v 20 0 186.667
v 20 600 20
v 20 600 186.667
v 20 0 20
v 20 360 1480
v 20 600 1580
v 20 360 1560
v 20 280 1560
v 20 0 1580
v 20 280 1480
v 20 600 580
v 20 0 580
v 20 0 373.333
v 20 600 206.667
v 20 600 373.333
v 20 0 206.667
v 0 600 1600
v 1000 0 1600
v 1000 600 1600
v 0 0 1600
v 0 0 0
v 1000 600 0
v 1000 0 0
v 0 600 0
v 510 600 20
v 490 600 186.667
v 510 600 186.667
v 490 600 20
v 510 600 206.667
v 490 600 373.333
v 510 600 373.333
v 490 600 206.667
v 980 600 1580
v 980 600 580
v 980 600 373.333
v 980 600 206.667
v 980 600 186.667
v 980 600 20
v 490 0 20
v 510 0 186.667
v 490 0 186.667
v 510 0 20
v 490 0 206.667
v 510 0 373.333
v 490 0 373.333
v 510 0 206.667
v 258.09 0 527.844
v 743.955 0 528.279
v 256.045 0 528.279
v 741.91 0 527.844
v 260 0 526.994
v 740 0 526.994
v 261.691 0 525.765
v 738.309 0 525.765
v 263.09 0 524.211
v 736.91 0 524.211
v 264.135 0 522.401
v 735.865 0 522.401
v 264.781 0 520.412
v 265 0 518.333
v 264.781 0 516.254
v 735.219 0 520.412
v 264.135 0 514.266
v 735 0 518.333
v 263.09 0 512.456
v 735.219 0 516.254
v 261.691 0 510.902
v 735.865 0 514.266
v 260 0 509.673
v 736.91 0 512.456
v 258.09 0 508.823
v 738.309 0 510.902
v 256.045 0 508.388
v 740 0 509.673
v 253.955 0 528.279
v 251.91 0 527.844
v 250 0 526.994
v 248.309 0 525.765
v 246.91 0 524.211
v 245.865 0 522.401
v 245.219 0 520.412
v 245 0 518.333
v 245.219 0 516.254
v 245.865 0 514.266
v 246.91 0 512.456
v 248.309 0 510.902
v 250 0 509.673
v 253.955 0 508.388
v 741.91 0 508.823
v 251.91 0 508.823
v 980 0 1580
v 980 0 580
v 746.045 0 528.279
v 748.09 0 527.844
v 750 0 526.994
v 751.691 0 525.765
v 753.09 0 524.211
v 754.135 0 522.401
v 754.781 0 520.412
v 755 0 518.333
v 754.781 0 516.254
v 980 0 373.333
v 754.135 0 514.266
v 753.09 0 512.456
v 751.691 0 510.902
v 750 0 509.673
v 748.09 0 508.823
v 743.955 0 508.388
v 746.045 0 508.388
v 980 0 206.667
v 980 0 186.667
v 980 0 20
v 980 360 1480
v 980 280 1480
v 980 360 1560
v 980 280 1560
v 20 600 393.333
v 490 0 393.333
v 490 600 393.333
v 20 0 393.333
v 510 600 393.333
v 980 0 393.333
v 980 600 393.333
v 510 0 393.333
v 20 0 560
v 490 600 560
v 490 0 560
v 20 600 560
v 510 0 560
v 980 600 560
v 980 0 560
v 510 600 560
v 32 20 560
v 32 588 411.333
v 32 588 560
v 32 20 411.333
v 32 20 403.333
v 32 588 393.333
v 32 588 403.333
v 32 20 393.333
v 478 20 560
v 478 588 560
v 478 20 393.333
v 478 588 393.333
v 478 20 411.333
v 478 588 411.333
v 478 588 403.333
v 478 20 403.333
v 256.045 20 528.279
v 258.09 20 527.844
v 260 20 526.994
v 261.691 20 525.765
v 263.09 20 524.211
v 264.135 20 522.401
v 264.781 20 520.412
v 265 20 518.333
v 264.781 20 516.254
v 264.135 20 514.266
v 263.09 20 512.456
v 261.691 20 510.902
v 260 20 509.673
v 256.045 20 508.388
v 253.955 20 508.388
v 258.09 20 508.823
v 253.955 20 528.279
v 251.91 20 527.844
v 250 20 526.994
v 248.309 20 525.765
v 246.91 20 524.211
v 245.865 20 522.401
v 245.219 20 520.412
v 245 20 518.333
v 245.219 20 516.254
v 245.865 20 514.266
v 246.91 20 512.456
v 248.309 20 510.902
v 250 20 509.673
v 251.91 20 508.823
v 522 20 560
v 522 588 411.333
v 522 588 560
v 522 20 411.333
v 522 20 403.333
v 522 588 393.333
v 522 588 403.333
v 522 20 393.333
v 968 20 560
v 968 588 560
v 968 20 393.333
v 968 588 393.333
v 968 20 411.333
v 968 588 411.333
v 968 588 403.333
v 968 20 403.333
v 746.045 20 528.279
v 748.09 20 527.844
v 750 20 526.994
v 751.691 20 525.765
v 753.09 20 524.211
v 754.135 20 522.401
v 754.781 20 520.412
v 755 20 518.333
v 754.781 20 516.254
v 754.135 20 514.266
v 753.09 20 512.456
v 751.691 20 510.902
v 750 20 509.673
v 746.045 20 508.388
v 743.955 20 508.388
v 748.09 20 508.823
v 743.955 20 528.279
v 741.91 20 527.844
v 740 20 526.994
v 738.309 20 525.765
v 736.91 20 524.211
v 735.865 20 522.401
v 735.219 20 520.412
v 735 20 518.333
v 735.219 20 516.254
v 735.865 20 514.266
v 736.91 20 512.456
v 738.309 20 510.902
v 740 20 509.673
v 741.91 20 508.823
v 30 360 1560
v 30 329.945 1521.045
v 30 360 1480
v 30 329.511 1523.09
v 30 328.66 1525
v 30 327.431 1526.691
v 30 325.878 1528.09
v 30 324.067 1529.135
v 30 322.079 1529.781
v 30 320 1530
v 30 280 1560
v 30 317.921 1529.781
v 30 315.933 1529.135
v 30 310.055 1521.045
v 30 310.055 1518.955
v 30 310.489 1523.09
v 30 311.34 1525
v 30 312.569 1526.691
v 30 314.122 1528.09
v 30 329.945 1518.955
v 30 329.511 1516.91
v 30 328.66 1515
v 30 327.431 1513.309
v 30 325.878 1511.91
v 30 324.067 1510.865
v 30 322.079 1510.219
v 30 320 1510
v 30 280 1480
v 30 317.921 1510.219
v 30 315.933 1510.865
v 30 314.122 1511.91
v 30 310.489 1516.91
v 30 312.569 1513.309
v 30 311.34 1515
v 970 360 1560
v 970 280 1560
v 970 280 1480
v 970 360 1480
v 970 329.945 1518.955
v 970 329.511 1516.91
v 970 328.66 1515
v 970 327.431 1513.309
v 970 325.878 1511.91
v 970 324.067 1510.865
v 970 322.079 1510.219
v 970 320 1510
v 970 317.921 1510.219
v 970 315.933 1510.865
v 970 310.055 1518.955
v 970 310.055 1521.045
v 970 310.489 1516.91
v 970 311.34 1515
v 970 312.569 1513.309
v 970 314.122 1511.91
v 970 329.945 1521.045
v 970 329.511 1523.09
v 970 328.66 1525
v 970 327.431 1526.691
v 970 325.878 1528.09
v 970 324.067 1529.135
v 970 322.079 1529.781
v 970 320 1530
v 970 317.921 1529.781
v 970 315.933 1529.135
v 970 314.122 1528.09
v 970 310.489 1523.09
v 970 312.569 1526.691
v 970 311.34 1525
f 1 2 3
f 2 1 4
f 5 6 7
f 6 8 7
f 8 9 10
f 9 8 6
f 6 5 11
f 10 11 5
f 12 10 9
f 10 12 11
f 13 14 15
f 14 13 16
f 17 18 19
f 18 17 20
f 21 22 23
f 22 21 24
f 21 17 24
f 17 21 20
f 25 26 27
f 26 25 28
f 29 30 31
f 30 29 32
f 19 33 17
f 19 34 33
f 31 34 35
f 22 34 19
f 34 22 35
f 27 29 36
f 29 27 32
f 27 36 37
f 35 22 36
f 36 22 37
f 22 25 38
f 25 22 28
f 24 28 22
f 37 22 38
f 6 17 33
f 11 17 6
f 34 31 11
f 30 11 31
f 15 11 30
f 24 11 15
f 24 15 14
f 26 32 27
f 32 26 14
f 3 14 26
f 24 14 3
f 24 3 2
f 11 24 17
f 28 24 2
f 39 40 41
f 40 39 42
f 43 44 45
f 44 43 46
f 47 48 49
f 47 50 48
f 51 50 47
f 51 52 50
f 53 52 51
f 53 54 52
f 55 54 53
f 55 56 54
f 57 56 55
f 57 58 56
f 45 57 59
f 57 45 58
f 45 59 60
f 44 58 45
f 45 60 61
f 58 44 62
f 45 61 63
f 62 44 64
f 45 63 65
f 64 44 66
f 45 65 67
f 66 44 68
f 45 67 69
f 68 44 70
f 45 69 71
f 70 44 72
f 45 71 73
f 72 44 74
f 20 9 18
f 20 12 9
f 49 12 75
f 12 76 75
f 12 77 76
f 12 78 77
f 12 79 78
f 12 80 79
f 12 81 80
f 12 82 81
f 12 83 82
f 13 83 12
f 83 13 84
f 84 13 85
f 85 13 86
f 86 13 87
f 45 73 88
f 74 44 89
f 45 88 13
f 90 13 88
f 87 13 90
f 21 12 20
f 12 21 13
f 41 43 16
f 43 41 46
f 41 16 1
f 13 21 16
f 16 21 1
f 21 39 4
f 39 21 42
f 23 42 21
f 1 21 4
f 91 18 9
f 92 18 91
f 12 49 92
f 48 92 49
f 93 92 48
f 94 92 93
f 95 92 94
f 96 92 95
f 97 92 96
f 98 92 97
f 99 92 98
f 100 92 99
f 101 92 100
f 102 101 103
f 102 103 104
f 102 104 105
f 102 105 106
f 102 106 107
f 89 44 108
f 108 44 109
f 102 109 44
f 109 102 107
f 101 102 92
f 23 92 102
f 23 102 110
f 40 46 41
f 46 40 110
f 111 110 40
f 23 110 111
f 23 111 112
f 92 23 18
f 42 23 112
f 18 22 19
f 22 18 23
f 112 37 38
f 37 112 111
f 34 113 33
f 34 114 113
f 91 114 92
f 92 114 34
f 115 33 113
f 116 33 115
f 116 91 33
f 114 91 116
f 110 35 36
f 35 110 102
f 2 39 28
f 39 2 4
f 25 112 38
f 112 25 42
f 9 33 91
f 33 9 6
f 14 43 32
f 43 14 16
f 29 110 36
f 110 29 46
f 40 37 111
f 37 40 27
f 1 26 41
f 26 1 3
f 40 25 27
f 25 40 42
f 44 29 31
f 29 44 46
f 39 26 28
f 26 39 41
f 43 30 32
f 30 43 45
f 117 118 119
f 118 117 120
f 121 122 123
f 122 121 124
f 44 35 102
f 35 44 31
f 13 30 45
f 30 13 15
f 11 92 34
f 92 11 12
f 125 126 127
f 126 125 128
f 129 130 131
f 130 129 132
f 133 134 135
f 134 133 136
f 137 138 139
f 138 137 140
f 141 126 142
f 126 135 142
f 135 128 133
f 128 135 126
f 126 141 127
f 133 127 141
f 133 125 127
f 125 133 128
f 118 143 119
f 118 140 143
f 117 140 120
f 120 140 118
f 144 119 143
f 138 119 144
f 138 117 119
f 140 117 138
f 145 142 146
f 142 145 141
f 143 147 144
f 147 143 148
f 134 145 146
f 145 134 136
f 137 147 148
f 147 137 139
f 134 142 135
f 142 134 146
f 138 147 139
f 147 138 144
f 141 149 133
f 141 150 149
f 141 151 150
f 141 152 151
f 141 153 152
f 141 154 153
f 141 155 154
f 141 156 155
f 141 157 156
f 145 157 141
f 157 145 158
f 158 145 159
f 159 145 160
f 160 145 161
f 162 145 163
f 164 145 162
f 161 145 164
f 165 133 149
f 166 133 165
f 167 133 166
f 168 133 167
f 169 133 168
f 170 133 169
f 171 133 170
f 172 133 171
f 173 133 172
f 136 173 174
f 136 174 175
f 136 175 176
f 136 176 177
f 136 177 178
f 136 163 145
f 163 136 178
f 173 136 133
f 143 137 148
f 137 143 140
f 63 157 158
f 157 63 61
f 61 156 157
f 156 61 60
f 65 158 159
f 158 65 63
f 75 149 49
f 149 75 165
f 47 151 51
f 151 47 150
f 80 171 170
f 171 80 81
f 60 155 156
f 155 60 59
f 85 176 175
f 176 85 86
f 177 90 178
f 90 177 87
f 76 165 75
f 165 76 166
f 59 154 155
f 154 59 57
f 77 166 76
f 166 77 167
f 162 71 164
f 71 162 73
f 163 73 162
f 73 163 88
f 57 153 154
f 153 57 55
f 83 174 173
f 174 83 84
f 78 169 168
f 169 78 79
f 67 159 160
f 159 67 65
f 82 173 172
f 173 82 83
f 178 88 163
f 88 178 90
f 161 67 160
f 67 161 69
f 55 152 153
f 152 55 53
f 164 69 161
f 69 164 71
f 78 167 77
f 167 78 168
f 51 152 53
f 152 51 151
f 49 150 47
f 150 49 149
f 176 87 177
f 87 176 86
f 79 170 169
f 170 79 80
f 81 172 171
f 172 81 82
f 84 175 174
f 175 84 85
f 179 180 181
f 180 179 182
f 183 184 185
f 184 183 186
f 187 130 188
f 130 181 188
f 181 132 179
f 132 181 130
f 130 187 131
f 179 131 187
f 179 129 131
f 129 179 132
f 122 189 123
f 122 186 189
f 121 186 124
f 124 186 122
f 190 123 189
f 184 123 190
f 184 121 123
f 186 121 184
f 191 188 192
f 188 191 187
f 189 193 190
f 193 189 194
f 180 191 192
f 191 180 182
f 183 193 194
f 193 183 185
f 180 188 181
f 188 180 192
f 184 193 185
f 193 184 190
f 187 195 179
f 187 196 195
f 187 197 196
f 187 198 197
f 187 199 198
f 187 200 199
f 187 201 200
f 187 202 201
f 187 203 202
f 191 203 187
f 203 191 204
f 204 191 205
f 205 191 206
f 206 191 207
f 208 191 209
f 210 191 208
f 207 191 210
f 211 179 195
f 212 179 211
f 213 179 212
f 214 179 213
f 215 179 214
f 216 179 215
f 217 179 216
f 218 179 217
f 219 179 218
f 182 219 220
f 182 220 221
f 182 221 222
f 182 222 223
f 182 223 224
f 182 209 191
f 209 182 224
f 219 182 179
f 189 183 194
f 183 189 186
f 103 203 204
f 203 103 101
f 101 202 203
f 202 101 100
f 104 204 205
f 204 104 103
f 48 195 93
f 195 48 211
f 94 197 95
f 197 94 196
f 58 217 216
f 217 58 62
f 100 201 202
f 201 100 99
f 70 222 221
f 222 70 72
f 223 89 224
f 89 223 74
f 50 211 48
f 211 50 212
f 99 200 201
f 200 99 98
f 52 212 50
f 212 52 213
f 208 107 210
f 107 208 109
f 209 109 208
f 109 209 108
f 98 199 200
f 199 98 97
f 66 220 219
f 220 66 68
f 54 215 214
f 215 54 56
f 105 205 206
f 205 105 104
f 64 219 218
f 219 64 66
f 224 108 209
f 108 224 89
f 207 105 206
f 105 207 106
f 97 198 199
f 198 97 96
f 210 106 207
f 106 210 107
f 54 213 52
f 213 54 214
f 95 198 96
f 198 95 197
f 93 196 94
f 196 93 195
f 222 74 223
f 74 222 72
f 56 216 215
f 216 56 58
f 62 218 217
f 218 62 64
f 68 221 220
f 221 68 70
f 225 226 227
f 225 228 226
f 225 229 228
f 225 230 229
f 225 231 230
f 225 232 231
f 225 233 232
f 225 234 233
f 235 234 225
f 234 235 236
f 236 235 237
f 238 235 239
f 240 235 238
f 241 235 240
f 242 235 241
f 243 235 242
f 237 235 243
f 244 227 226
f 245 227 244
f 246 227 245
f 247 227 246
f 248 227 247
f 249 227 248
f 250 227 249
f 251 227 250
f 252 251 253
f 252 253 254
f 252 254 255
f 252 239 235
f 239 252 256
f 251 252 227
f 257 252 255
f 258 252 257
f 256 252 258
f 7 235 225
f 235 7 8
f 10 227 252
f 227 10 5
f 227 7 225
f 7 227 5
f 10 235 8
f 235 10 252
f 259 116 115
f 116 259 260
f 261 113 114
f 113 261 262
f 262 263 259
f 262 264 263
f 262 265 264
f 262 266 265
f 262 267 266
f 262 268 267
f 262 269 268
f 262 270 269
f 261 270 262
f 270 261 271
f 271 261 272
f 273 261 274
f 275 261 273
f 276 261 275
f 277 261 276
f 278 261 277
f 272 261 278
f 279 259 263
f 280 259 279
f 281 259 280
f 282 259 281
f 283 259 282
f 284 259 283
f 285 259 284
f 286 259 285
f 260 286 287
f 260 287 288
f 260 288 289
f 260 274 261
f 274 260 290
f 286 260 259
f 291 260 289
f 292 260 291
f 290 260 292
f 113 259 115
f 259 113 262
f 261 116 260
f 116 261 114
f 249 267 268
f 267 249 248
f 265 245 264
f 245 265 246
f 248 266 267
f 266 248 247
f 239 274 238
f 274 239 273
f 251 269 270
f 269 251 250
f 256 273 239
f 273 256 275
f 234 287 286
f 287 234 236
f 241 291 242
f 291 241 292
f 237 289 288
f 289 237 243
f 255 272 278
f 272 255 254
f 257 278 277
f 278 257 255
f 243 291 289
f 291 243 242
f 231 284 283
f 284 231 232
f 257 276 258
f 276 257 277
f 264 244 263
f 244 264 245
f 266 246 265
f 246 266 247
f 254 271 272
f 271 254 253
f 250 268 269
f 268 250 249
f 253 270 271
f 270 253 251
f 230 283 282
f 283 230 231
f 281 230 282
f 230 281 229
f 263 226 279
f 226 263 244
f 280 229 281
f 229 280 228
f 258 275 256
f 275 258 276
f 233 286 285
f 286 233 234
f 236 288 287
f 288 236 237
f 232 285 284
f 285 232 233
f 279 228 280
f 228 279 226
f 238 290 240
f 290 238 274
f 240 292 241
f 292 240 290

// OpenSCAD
// file: module/hanger.scad
/*

    Hanger
    
    By Anton Augustsson


*/



module hanger (
    rodDiameter,
    rodLength,
    x,y,z
    ){
/*
    ---------- Local varibles ---------- 
*/

mountWidth = rodDiameter*4;
mountThickness = rodDiameter/2;
        
/*
    ---------- Code ---------- 
*/

color("BurlyWood")
translate([
    x,
    y,
    z]) 
union () {
    
// Left mount width
translate([
    0,
    0,
    0]) 
cube(size = [
    mountThickness,
    mountWidth,
    mountWidth]);

// Right mount width
translate([
    rodLength-mountThickness,
    0,
    0]) 
cube(size = [
    mountThickness,
    mountWidth,
    mountWidth]);

translate([
    0,                   
    mountWidth/2,   
    mountWidth/2
    ])  
rotate([0,90,0])
cylinder(
    h = rodLength,
    r = rodDiameter/2
    );      
}}
    
/*
    ---------- Example ---------- 
*/


thicknessBottom = 14;
thicknessSide   = 14;
thicknessFront  = 20;

length = 500;
width  = 600;
height = 100;


x=0;
y=0;
z=0;
yRotate=0;

hanger (
    20,
    1000,
    x,y,z
    );
// file: module/dovetail-drawer.scad
/*

    Dovetail Drawer
    
    By Anton Augustsson


*/

// use dovtail library

module dovetailDrawer (
    thicknessBottom,
    thicknessSide,
    thicknessFront,
    lenghtDrawer,
    widthDrawer,
    heightDrawer,
    xDrawer,yDrawer,zDrawer,
    yRotate
    ){
/*
    ---------- Local varibles ---------- 
*/

length = lenghtDrawer;
width  = widthDrawer;
height = heightDrawer;

x=xDrawer;
y=yDrawer;
z=zDrawer;

/*
    ---------- Code ---------- 
*/

translate([
    x,
    y,
    z]) 
rotate([0,yRotate,0])
difference () {
union () {

// Left
color("Wheat")
translate([
    0,
    thicknessFront/4,
    0]) 
cube(size = [
    thicknessSide,
    length-thicknessFront/4,
    height]);

// Right
color("Wheat")
translate([
    width-thicknessSide,
    thicknessFront/4,
    0]) 
cube(size = [
    thicknessSide,
    length-thicknessFront/4,
    height]);
    
// Bottom 
color("Wheat")
translate([
    thicknessSide/2,
    thicknessFront,
    10]) 
cube(size = [
    width-thicknessSide,
    length-thicknessFront-thicknessSide,
    thicknessBottom]);

// Back
color("Wheat")
translate([
    0,
    length-thicknessSide,
    0]) 
cube(size = [
    width,
    thicknessSide,
    height]);

// Front
color("BurlyWood")
translate([
    0,
    0,
    0]) 
cube(size = [
    width,
    thicknessFront,
    height]);    
}


translate([
    width/2,                   
    -1,   
    height/4*3
    ])  
rotate([270,0,0])
cylinder(
    h = thicknessFront+2,    
    r = 10        
    );      

}}
    
/*
    ---------- Example ---------- 
*/


thicknessBottom = 14;
thicknessSide   = 14;
thicknessFront  = 20;

length = 500;
width  = 600;
height = 100;


x=0;
y=0;
z=0;
yRotate=0;

dovetailDrawer (
    thicknessBottom,
    thicknessSide,
    thicknessFront,
    length,
    width,
    height,
    x,y,z,
    yRotate
    );
// main file
/*

    Walk-in closet
    
    By Anton Augustsson
    
    
*/

use <module/dovetail-drawer.scad>;
use <module/hanger.scad>;

/*
    ---------- Variables ---------- 
*/

totalWidth  = 1000;
totalDepth  = 600; 
totalHeight = 1600;

frameThickness = 20;
shelfThickness = frameThickness;

drawerThicknessBottom = 8;
drawerThicknessSide   = 12;
drawerThicknessFront  = 20;
drawerDepth  = totalDepth;
drawerWidth  = (totalWidth
    -frameThickness*2
    -shelfThickness)/2;
drawerHeight = 100;

hangingHeight = 1000;

shelfHeight = (totalHeight
    -hangingHeight
    -frameThickness*2
    -shelfThickness*3)/3;

shelf1Position = shelfHeight
    +frameThickness;
shelf2Position = shelfHeight*2
    +frameThickness
    +shelfThickness;
shelf3Position = shelfHeight*3
    +frameThickness
    +shelfThickness*2;

/*
    ---------- Code ---------- 
*/


// ---------- Frame ---------- 
color("Wheat")
union () {
// Left
translate([
    0,
    0,
    0]) 
cube(size = [
    frameThickness,
    totalDepth,
    totalHeight]);

// Right
translate([
    totalWidth-frameThickness,
    0,
    0]) 
cube(size = [
    frameThickness,
    totalDepth,
    totalHeight]);

// Bottom
translate([
    frameThickness,
    0,
    0]) 
cube(size = [
    totalWidth-frameThickness*2,
    totalDepth,
    frameThickness]);

// Top
translate([
    frameThickness,
    0,
    totalHeight-frameThickness]) 
cube(size = [
    totalWidth-frameThickness*2,
    totalDepth,
    frameThickness]);
}

// ---------- Shelf ---------- 
color("Tan")
union () {

// Shelf 1
translate([
    frameThickness,
    0,
    shelf1Position]) 
cube(size = [
    totalWidth-frameThickness*2,
    totalDepth,
    shelfThickness]);

// Devider B S1-S2
translate([
    (totalWidth-shelfThickness)/2,
    0,
    frameThickness]) 
cube(size = [
    shelfThickness,
    totalDepth,
    shelf1Position-frameThickness]);

// Shelf 2
translate([
    frameThickness,
    0,
    shelf2Position]) 
cube(size = [
    totalWidth-frameThickness*2,
    totalDepth,
    shelfThickness]);

// Devider B S2-S3
translate([
    (totalWidth-shelfThickness)/2,
    0,
    frameThickness]) 
cube(size = [
    shelfThickness,
    totalDepth,
    shelf2Position-frameThickness]);
    
// Shelf 3
translate([
    frameThickness,
    0,
    shelf3Position]) 
cube(size = [
    totalWidth-frameThickness*2,
    totalDepth,
    shelfThickness]);

// Devider B S2-S3
translate([
    (totalWidth-shelfThickness)/2,
    0,
    frameThickness]) 
cube(size = [
    shelfThickness,
    totalDepth,
    shelf3Position-frameThickness]);
}

// Left
dovetailDrawer (
    drawerThicknessBottom,
    drawerThicknessSide,
    drawerThicknessFront,
    totalDepth,
    (totalWidth-shelfThickness)/2
    -shelfThickness,
    shelfHeight,
    frameThickness,0,
    shelf2Position+shelfThickness,
    0
    );

// Right
dovetailDrawer (
    drawerThicknessBottom,
    drawerThicknessSide,
    drawerThicknessFront,
    totalDepth,
    (totalWidth-shelfThickness)/2
    -shelfThickness,
    shelfHeight,
    (totalWidth-shelfThickness)/2
    +frameThickness,0,
    shelf2Position+shelfThickness,
    0
    );
    
hanger (
    20,
    totalWidth-frameThickness*2,
    frameThickness,
    totalDepth/2-20,
    totalHeight-frameThickness-100
    );
